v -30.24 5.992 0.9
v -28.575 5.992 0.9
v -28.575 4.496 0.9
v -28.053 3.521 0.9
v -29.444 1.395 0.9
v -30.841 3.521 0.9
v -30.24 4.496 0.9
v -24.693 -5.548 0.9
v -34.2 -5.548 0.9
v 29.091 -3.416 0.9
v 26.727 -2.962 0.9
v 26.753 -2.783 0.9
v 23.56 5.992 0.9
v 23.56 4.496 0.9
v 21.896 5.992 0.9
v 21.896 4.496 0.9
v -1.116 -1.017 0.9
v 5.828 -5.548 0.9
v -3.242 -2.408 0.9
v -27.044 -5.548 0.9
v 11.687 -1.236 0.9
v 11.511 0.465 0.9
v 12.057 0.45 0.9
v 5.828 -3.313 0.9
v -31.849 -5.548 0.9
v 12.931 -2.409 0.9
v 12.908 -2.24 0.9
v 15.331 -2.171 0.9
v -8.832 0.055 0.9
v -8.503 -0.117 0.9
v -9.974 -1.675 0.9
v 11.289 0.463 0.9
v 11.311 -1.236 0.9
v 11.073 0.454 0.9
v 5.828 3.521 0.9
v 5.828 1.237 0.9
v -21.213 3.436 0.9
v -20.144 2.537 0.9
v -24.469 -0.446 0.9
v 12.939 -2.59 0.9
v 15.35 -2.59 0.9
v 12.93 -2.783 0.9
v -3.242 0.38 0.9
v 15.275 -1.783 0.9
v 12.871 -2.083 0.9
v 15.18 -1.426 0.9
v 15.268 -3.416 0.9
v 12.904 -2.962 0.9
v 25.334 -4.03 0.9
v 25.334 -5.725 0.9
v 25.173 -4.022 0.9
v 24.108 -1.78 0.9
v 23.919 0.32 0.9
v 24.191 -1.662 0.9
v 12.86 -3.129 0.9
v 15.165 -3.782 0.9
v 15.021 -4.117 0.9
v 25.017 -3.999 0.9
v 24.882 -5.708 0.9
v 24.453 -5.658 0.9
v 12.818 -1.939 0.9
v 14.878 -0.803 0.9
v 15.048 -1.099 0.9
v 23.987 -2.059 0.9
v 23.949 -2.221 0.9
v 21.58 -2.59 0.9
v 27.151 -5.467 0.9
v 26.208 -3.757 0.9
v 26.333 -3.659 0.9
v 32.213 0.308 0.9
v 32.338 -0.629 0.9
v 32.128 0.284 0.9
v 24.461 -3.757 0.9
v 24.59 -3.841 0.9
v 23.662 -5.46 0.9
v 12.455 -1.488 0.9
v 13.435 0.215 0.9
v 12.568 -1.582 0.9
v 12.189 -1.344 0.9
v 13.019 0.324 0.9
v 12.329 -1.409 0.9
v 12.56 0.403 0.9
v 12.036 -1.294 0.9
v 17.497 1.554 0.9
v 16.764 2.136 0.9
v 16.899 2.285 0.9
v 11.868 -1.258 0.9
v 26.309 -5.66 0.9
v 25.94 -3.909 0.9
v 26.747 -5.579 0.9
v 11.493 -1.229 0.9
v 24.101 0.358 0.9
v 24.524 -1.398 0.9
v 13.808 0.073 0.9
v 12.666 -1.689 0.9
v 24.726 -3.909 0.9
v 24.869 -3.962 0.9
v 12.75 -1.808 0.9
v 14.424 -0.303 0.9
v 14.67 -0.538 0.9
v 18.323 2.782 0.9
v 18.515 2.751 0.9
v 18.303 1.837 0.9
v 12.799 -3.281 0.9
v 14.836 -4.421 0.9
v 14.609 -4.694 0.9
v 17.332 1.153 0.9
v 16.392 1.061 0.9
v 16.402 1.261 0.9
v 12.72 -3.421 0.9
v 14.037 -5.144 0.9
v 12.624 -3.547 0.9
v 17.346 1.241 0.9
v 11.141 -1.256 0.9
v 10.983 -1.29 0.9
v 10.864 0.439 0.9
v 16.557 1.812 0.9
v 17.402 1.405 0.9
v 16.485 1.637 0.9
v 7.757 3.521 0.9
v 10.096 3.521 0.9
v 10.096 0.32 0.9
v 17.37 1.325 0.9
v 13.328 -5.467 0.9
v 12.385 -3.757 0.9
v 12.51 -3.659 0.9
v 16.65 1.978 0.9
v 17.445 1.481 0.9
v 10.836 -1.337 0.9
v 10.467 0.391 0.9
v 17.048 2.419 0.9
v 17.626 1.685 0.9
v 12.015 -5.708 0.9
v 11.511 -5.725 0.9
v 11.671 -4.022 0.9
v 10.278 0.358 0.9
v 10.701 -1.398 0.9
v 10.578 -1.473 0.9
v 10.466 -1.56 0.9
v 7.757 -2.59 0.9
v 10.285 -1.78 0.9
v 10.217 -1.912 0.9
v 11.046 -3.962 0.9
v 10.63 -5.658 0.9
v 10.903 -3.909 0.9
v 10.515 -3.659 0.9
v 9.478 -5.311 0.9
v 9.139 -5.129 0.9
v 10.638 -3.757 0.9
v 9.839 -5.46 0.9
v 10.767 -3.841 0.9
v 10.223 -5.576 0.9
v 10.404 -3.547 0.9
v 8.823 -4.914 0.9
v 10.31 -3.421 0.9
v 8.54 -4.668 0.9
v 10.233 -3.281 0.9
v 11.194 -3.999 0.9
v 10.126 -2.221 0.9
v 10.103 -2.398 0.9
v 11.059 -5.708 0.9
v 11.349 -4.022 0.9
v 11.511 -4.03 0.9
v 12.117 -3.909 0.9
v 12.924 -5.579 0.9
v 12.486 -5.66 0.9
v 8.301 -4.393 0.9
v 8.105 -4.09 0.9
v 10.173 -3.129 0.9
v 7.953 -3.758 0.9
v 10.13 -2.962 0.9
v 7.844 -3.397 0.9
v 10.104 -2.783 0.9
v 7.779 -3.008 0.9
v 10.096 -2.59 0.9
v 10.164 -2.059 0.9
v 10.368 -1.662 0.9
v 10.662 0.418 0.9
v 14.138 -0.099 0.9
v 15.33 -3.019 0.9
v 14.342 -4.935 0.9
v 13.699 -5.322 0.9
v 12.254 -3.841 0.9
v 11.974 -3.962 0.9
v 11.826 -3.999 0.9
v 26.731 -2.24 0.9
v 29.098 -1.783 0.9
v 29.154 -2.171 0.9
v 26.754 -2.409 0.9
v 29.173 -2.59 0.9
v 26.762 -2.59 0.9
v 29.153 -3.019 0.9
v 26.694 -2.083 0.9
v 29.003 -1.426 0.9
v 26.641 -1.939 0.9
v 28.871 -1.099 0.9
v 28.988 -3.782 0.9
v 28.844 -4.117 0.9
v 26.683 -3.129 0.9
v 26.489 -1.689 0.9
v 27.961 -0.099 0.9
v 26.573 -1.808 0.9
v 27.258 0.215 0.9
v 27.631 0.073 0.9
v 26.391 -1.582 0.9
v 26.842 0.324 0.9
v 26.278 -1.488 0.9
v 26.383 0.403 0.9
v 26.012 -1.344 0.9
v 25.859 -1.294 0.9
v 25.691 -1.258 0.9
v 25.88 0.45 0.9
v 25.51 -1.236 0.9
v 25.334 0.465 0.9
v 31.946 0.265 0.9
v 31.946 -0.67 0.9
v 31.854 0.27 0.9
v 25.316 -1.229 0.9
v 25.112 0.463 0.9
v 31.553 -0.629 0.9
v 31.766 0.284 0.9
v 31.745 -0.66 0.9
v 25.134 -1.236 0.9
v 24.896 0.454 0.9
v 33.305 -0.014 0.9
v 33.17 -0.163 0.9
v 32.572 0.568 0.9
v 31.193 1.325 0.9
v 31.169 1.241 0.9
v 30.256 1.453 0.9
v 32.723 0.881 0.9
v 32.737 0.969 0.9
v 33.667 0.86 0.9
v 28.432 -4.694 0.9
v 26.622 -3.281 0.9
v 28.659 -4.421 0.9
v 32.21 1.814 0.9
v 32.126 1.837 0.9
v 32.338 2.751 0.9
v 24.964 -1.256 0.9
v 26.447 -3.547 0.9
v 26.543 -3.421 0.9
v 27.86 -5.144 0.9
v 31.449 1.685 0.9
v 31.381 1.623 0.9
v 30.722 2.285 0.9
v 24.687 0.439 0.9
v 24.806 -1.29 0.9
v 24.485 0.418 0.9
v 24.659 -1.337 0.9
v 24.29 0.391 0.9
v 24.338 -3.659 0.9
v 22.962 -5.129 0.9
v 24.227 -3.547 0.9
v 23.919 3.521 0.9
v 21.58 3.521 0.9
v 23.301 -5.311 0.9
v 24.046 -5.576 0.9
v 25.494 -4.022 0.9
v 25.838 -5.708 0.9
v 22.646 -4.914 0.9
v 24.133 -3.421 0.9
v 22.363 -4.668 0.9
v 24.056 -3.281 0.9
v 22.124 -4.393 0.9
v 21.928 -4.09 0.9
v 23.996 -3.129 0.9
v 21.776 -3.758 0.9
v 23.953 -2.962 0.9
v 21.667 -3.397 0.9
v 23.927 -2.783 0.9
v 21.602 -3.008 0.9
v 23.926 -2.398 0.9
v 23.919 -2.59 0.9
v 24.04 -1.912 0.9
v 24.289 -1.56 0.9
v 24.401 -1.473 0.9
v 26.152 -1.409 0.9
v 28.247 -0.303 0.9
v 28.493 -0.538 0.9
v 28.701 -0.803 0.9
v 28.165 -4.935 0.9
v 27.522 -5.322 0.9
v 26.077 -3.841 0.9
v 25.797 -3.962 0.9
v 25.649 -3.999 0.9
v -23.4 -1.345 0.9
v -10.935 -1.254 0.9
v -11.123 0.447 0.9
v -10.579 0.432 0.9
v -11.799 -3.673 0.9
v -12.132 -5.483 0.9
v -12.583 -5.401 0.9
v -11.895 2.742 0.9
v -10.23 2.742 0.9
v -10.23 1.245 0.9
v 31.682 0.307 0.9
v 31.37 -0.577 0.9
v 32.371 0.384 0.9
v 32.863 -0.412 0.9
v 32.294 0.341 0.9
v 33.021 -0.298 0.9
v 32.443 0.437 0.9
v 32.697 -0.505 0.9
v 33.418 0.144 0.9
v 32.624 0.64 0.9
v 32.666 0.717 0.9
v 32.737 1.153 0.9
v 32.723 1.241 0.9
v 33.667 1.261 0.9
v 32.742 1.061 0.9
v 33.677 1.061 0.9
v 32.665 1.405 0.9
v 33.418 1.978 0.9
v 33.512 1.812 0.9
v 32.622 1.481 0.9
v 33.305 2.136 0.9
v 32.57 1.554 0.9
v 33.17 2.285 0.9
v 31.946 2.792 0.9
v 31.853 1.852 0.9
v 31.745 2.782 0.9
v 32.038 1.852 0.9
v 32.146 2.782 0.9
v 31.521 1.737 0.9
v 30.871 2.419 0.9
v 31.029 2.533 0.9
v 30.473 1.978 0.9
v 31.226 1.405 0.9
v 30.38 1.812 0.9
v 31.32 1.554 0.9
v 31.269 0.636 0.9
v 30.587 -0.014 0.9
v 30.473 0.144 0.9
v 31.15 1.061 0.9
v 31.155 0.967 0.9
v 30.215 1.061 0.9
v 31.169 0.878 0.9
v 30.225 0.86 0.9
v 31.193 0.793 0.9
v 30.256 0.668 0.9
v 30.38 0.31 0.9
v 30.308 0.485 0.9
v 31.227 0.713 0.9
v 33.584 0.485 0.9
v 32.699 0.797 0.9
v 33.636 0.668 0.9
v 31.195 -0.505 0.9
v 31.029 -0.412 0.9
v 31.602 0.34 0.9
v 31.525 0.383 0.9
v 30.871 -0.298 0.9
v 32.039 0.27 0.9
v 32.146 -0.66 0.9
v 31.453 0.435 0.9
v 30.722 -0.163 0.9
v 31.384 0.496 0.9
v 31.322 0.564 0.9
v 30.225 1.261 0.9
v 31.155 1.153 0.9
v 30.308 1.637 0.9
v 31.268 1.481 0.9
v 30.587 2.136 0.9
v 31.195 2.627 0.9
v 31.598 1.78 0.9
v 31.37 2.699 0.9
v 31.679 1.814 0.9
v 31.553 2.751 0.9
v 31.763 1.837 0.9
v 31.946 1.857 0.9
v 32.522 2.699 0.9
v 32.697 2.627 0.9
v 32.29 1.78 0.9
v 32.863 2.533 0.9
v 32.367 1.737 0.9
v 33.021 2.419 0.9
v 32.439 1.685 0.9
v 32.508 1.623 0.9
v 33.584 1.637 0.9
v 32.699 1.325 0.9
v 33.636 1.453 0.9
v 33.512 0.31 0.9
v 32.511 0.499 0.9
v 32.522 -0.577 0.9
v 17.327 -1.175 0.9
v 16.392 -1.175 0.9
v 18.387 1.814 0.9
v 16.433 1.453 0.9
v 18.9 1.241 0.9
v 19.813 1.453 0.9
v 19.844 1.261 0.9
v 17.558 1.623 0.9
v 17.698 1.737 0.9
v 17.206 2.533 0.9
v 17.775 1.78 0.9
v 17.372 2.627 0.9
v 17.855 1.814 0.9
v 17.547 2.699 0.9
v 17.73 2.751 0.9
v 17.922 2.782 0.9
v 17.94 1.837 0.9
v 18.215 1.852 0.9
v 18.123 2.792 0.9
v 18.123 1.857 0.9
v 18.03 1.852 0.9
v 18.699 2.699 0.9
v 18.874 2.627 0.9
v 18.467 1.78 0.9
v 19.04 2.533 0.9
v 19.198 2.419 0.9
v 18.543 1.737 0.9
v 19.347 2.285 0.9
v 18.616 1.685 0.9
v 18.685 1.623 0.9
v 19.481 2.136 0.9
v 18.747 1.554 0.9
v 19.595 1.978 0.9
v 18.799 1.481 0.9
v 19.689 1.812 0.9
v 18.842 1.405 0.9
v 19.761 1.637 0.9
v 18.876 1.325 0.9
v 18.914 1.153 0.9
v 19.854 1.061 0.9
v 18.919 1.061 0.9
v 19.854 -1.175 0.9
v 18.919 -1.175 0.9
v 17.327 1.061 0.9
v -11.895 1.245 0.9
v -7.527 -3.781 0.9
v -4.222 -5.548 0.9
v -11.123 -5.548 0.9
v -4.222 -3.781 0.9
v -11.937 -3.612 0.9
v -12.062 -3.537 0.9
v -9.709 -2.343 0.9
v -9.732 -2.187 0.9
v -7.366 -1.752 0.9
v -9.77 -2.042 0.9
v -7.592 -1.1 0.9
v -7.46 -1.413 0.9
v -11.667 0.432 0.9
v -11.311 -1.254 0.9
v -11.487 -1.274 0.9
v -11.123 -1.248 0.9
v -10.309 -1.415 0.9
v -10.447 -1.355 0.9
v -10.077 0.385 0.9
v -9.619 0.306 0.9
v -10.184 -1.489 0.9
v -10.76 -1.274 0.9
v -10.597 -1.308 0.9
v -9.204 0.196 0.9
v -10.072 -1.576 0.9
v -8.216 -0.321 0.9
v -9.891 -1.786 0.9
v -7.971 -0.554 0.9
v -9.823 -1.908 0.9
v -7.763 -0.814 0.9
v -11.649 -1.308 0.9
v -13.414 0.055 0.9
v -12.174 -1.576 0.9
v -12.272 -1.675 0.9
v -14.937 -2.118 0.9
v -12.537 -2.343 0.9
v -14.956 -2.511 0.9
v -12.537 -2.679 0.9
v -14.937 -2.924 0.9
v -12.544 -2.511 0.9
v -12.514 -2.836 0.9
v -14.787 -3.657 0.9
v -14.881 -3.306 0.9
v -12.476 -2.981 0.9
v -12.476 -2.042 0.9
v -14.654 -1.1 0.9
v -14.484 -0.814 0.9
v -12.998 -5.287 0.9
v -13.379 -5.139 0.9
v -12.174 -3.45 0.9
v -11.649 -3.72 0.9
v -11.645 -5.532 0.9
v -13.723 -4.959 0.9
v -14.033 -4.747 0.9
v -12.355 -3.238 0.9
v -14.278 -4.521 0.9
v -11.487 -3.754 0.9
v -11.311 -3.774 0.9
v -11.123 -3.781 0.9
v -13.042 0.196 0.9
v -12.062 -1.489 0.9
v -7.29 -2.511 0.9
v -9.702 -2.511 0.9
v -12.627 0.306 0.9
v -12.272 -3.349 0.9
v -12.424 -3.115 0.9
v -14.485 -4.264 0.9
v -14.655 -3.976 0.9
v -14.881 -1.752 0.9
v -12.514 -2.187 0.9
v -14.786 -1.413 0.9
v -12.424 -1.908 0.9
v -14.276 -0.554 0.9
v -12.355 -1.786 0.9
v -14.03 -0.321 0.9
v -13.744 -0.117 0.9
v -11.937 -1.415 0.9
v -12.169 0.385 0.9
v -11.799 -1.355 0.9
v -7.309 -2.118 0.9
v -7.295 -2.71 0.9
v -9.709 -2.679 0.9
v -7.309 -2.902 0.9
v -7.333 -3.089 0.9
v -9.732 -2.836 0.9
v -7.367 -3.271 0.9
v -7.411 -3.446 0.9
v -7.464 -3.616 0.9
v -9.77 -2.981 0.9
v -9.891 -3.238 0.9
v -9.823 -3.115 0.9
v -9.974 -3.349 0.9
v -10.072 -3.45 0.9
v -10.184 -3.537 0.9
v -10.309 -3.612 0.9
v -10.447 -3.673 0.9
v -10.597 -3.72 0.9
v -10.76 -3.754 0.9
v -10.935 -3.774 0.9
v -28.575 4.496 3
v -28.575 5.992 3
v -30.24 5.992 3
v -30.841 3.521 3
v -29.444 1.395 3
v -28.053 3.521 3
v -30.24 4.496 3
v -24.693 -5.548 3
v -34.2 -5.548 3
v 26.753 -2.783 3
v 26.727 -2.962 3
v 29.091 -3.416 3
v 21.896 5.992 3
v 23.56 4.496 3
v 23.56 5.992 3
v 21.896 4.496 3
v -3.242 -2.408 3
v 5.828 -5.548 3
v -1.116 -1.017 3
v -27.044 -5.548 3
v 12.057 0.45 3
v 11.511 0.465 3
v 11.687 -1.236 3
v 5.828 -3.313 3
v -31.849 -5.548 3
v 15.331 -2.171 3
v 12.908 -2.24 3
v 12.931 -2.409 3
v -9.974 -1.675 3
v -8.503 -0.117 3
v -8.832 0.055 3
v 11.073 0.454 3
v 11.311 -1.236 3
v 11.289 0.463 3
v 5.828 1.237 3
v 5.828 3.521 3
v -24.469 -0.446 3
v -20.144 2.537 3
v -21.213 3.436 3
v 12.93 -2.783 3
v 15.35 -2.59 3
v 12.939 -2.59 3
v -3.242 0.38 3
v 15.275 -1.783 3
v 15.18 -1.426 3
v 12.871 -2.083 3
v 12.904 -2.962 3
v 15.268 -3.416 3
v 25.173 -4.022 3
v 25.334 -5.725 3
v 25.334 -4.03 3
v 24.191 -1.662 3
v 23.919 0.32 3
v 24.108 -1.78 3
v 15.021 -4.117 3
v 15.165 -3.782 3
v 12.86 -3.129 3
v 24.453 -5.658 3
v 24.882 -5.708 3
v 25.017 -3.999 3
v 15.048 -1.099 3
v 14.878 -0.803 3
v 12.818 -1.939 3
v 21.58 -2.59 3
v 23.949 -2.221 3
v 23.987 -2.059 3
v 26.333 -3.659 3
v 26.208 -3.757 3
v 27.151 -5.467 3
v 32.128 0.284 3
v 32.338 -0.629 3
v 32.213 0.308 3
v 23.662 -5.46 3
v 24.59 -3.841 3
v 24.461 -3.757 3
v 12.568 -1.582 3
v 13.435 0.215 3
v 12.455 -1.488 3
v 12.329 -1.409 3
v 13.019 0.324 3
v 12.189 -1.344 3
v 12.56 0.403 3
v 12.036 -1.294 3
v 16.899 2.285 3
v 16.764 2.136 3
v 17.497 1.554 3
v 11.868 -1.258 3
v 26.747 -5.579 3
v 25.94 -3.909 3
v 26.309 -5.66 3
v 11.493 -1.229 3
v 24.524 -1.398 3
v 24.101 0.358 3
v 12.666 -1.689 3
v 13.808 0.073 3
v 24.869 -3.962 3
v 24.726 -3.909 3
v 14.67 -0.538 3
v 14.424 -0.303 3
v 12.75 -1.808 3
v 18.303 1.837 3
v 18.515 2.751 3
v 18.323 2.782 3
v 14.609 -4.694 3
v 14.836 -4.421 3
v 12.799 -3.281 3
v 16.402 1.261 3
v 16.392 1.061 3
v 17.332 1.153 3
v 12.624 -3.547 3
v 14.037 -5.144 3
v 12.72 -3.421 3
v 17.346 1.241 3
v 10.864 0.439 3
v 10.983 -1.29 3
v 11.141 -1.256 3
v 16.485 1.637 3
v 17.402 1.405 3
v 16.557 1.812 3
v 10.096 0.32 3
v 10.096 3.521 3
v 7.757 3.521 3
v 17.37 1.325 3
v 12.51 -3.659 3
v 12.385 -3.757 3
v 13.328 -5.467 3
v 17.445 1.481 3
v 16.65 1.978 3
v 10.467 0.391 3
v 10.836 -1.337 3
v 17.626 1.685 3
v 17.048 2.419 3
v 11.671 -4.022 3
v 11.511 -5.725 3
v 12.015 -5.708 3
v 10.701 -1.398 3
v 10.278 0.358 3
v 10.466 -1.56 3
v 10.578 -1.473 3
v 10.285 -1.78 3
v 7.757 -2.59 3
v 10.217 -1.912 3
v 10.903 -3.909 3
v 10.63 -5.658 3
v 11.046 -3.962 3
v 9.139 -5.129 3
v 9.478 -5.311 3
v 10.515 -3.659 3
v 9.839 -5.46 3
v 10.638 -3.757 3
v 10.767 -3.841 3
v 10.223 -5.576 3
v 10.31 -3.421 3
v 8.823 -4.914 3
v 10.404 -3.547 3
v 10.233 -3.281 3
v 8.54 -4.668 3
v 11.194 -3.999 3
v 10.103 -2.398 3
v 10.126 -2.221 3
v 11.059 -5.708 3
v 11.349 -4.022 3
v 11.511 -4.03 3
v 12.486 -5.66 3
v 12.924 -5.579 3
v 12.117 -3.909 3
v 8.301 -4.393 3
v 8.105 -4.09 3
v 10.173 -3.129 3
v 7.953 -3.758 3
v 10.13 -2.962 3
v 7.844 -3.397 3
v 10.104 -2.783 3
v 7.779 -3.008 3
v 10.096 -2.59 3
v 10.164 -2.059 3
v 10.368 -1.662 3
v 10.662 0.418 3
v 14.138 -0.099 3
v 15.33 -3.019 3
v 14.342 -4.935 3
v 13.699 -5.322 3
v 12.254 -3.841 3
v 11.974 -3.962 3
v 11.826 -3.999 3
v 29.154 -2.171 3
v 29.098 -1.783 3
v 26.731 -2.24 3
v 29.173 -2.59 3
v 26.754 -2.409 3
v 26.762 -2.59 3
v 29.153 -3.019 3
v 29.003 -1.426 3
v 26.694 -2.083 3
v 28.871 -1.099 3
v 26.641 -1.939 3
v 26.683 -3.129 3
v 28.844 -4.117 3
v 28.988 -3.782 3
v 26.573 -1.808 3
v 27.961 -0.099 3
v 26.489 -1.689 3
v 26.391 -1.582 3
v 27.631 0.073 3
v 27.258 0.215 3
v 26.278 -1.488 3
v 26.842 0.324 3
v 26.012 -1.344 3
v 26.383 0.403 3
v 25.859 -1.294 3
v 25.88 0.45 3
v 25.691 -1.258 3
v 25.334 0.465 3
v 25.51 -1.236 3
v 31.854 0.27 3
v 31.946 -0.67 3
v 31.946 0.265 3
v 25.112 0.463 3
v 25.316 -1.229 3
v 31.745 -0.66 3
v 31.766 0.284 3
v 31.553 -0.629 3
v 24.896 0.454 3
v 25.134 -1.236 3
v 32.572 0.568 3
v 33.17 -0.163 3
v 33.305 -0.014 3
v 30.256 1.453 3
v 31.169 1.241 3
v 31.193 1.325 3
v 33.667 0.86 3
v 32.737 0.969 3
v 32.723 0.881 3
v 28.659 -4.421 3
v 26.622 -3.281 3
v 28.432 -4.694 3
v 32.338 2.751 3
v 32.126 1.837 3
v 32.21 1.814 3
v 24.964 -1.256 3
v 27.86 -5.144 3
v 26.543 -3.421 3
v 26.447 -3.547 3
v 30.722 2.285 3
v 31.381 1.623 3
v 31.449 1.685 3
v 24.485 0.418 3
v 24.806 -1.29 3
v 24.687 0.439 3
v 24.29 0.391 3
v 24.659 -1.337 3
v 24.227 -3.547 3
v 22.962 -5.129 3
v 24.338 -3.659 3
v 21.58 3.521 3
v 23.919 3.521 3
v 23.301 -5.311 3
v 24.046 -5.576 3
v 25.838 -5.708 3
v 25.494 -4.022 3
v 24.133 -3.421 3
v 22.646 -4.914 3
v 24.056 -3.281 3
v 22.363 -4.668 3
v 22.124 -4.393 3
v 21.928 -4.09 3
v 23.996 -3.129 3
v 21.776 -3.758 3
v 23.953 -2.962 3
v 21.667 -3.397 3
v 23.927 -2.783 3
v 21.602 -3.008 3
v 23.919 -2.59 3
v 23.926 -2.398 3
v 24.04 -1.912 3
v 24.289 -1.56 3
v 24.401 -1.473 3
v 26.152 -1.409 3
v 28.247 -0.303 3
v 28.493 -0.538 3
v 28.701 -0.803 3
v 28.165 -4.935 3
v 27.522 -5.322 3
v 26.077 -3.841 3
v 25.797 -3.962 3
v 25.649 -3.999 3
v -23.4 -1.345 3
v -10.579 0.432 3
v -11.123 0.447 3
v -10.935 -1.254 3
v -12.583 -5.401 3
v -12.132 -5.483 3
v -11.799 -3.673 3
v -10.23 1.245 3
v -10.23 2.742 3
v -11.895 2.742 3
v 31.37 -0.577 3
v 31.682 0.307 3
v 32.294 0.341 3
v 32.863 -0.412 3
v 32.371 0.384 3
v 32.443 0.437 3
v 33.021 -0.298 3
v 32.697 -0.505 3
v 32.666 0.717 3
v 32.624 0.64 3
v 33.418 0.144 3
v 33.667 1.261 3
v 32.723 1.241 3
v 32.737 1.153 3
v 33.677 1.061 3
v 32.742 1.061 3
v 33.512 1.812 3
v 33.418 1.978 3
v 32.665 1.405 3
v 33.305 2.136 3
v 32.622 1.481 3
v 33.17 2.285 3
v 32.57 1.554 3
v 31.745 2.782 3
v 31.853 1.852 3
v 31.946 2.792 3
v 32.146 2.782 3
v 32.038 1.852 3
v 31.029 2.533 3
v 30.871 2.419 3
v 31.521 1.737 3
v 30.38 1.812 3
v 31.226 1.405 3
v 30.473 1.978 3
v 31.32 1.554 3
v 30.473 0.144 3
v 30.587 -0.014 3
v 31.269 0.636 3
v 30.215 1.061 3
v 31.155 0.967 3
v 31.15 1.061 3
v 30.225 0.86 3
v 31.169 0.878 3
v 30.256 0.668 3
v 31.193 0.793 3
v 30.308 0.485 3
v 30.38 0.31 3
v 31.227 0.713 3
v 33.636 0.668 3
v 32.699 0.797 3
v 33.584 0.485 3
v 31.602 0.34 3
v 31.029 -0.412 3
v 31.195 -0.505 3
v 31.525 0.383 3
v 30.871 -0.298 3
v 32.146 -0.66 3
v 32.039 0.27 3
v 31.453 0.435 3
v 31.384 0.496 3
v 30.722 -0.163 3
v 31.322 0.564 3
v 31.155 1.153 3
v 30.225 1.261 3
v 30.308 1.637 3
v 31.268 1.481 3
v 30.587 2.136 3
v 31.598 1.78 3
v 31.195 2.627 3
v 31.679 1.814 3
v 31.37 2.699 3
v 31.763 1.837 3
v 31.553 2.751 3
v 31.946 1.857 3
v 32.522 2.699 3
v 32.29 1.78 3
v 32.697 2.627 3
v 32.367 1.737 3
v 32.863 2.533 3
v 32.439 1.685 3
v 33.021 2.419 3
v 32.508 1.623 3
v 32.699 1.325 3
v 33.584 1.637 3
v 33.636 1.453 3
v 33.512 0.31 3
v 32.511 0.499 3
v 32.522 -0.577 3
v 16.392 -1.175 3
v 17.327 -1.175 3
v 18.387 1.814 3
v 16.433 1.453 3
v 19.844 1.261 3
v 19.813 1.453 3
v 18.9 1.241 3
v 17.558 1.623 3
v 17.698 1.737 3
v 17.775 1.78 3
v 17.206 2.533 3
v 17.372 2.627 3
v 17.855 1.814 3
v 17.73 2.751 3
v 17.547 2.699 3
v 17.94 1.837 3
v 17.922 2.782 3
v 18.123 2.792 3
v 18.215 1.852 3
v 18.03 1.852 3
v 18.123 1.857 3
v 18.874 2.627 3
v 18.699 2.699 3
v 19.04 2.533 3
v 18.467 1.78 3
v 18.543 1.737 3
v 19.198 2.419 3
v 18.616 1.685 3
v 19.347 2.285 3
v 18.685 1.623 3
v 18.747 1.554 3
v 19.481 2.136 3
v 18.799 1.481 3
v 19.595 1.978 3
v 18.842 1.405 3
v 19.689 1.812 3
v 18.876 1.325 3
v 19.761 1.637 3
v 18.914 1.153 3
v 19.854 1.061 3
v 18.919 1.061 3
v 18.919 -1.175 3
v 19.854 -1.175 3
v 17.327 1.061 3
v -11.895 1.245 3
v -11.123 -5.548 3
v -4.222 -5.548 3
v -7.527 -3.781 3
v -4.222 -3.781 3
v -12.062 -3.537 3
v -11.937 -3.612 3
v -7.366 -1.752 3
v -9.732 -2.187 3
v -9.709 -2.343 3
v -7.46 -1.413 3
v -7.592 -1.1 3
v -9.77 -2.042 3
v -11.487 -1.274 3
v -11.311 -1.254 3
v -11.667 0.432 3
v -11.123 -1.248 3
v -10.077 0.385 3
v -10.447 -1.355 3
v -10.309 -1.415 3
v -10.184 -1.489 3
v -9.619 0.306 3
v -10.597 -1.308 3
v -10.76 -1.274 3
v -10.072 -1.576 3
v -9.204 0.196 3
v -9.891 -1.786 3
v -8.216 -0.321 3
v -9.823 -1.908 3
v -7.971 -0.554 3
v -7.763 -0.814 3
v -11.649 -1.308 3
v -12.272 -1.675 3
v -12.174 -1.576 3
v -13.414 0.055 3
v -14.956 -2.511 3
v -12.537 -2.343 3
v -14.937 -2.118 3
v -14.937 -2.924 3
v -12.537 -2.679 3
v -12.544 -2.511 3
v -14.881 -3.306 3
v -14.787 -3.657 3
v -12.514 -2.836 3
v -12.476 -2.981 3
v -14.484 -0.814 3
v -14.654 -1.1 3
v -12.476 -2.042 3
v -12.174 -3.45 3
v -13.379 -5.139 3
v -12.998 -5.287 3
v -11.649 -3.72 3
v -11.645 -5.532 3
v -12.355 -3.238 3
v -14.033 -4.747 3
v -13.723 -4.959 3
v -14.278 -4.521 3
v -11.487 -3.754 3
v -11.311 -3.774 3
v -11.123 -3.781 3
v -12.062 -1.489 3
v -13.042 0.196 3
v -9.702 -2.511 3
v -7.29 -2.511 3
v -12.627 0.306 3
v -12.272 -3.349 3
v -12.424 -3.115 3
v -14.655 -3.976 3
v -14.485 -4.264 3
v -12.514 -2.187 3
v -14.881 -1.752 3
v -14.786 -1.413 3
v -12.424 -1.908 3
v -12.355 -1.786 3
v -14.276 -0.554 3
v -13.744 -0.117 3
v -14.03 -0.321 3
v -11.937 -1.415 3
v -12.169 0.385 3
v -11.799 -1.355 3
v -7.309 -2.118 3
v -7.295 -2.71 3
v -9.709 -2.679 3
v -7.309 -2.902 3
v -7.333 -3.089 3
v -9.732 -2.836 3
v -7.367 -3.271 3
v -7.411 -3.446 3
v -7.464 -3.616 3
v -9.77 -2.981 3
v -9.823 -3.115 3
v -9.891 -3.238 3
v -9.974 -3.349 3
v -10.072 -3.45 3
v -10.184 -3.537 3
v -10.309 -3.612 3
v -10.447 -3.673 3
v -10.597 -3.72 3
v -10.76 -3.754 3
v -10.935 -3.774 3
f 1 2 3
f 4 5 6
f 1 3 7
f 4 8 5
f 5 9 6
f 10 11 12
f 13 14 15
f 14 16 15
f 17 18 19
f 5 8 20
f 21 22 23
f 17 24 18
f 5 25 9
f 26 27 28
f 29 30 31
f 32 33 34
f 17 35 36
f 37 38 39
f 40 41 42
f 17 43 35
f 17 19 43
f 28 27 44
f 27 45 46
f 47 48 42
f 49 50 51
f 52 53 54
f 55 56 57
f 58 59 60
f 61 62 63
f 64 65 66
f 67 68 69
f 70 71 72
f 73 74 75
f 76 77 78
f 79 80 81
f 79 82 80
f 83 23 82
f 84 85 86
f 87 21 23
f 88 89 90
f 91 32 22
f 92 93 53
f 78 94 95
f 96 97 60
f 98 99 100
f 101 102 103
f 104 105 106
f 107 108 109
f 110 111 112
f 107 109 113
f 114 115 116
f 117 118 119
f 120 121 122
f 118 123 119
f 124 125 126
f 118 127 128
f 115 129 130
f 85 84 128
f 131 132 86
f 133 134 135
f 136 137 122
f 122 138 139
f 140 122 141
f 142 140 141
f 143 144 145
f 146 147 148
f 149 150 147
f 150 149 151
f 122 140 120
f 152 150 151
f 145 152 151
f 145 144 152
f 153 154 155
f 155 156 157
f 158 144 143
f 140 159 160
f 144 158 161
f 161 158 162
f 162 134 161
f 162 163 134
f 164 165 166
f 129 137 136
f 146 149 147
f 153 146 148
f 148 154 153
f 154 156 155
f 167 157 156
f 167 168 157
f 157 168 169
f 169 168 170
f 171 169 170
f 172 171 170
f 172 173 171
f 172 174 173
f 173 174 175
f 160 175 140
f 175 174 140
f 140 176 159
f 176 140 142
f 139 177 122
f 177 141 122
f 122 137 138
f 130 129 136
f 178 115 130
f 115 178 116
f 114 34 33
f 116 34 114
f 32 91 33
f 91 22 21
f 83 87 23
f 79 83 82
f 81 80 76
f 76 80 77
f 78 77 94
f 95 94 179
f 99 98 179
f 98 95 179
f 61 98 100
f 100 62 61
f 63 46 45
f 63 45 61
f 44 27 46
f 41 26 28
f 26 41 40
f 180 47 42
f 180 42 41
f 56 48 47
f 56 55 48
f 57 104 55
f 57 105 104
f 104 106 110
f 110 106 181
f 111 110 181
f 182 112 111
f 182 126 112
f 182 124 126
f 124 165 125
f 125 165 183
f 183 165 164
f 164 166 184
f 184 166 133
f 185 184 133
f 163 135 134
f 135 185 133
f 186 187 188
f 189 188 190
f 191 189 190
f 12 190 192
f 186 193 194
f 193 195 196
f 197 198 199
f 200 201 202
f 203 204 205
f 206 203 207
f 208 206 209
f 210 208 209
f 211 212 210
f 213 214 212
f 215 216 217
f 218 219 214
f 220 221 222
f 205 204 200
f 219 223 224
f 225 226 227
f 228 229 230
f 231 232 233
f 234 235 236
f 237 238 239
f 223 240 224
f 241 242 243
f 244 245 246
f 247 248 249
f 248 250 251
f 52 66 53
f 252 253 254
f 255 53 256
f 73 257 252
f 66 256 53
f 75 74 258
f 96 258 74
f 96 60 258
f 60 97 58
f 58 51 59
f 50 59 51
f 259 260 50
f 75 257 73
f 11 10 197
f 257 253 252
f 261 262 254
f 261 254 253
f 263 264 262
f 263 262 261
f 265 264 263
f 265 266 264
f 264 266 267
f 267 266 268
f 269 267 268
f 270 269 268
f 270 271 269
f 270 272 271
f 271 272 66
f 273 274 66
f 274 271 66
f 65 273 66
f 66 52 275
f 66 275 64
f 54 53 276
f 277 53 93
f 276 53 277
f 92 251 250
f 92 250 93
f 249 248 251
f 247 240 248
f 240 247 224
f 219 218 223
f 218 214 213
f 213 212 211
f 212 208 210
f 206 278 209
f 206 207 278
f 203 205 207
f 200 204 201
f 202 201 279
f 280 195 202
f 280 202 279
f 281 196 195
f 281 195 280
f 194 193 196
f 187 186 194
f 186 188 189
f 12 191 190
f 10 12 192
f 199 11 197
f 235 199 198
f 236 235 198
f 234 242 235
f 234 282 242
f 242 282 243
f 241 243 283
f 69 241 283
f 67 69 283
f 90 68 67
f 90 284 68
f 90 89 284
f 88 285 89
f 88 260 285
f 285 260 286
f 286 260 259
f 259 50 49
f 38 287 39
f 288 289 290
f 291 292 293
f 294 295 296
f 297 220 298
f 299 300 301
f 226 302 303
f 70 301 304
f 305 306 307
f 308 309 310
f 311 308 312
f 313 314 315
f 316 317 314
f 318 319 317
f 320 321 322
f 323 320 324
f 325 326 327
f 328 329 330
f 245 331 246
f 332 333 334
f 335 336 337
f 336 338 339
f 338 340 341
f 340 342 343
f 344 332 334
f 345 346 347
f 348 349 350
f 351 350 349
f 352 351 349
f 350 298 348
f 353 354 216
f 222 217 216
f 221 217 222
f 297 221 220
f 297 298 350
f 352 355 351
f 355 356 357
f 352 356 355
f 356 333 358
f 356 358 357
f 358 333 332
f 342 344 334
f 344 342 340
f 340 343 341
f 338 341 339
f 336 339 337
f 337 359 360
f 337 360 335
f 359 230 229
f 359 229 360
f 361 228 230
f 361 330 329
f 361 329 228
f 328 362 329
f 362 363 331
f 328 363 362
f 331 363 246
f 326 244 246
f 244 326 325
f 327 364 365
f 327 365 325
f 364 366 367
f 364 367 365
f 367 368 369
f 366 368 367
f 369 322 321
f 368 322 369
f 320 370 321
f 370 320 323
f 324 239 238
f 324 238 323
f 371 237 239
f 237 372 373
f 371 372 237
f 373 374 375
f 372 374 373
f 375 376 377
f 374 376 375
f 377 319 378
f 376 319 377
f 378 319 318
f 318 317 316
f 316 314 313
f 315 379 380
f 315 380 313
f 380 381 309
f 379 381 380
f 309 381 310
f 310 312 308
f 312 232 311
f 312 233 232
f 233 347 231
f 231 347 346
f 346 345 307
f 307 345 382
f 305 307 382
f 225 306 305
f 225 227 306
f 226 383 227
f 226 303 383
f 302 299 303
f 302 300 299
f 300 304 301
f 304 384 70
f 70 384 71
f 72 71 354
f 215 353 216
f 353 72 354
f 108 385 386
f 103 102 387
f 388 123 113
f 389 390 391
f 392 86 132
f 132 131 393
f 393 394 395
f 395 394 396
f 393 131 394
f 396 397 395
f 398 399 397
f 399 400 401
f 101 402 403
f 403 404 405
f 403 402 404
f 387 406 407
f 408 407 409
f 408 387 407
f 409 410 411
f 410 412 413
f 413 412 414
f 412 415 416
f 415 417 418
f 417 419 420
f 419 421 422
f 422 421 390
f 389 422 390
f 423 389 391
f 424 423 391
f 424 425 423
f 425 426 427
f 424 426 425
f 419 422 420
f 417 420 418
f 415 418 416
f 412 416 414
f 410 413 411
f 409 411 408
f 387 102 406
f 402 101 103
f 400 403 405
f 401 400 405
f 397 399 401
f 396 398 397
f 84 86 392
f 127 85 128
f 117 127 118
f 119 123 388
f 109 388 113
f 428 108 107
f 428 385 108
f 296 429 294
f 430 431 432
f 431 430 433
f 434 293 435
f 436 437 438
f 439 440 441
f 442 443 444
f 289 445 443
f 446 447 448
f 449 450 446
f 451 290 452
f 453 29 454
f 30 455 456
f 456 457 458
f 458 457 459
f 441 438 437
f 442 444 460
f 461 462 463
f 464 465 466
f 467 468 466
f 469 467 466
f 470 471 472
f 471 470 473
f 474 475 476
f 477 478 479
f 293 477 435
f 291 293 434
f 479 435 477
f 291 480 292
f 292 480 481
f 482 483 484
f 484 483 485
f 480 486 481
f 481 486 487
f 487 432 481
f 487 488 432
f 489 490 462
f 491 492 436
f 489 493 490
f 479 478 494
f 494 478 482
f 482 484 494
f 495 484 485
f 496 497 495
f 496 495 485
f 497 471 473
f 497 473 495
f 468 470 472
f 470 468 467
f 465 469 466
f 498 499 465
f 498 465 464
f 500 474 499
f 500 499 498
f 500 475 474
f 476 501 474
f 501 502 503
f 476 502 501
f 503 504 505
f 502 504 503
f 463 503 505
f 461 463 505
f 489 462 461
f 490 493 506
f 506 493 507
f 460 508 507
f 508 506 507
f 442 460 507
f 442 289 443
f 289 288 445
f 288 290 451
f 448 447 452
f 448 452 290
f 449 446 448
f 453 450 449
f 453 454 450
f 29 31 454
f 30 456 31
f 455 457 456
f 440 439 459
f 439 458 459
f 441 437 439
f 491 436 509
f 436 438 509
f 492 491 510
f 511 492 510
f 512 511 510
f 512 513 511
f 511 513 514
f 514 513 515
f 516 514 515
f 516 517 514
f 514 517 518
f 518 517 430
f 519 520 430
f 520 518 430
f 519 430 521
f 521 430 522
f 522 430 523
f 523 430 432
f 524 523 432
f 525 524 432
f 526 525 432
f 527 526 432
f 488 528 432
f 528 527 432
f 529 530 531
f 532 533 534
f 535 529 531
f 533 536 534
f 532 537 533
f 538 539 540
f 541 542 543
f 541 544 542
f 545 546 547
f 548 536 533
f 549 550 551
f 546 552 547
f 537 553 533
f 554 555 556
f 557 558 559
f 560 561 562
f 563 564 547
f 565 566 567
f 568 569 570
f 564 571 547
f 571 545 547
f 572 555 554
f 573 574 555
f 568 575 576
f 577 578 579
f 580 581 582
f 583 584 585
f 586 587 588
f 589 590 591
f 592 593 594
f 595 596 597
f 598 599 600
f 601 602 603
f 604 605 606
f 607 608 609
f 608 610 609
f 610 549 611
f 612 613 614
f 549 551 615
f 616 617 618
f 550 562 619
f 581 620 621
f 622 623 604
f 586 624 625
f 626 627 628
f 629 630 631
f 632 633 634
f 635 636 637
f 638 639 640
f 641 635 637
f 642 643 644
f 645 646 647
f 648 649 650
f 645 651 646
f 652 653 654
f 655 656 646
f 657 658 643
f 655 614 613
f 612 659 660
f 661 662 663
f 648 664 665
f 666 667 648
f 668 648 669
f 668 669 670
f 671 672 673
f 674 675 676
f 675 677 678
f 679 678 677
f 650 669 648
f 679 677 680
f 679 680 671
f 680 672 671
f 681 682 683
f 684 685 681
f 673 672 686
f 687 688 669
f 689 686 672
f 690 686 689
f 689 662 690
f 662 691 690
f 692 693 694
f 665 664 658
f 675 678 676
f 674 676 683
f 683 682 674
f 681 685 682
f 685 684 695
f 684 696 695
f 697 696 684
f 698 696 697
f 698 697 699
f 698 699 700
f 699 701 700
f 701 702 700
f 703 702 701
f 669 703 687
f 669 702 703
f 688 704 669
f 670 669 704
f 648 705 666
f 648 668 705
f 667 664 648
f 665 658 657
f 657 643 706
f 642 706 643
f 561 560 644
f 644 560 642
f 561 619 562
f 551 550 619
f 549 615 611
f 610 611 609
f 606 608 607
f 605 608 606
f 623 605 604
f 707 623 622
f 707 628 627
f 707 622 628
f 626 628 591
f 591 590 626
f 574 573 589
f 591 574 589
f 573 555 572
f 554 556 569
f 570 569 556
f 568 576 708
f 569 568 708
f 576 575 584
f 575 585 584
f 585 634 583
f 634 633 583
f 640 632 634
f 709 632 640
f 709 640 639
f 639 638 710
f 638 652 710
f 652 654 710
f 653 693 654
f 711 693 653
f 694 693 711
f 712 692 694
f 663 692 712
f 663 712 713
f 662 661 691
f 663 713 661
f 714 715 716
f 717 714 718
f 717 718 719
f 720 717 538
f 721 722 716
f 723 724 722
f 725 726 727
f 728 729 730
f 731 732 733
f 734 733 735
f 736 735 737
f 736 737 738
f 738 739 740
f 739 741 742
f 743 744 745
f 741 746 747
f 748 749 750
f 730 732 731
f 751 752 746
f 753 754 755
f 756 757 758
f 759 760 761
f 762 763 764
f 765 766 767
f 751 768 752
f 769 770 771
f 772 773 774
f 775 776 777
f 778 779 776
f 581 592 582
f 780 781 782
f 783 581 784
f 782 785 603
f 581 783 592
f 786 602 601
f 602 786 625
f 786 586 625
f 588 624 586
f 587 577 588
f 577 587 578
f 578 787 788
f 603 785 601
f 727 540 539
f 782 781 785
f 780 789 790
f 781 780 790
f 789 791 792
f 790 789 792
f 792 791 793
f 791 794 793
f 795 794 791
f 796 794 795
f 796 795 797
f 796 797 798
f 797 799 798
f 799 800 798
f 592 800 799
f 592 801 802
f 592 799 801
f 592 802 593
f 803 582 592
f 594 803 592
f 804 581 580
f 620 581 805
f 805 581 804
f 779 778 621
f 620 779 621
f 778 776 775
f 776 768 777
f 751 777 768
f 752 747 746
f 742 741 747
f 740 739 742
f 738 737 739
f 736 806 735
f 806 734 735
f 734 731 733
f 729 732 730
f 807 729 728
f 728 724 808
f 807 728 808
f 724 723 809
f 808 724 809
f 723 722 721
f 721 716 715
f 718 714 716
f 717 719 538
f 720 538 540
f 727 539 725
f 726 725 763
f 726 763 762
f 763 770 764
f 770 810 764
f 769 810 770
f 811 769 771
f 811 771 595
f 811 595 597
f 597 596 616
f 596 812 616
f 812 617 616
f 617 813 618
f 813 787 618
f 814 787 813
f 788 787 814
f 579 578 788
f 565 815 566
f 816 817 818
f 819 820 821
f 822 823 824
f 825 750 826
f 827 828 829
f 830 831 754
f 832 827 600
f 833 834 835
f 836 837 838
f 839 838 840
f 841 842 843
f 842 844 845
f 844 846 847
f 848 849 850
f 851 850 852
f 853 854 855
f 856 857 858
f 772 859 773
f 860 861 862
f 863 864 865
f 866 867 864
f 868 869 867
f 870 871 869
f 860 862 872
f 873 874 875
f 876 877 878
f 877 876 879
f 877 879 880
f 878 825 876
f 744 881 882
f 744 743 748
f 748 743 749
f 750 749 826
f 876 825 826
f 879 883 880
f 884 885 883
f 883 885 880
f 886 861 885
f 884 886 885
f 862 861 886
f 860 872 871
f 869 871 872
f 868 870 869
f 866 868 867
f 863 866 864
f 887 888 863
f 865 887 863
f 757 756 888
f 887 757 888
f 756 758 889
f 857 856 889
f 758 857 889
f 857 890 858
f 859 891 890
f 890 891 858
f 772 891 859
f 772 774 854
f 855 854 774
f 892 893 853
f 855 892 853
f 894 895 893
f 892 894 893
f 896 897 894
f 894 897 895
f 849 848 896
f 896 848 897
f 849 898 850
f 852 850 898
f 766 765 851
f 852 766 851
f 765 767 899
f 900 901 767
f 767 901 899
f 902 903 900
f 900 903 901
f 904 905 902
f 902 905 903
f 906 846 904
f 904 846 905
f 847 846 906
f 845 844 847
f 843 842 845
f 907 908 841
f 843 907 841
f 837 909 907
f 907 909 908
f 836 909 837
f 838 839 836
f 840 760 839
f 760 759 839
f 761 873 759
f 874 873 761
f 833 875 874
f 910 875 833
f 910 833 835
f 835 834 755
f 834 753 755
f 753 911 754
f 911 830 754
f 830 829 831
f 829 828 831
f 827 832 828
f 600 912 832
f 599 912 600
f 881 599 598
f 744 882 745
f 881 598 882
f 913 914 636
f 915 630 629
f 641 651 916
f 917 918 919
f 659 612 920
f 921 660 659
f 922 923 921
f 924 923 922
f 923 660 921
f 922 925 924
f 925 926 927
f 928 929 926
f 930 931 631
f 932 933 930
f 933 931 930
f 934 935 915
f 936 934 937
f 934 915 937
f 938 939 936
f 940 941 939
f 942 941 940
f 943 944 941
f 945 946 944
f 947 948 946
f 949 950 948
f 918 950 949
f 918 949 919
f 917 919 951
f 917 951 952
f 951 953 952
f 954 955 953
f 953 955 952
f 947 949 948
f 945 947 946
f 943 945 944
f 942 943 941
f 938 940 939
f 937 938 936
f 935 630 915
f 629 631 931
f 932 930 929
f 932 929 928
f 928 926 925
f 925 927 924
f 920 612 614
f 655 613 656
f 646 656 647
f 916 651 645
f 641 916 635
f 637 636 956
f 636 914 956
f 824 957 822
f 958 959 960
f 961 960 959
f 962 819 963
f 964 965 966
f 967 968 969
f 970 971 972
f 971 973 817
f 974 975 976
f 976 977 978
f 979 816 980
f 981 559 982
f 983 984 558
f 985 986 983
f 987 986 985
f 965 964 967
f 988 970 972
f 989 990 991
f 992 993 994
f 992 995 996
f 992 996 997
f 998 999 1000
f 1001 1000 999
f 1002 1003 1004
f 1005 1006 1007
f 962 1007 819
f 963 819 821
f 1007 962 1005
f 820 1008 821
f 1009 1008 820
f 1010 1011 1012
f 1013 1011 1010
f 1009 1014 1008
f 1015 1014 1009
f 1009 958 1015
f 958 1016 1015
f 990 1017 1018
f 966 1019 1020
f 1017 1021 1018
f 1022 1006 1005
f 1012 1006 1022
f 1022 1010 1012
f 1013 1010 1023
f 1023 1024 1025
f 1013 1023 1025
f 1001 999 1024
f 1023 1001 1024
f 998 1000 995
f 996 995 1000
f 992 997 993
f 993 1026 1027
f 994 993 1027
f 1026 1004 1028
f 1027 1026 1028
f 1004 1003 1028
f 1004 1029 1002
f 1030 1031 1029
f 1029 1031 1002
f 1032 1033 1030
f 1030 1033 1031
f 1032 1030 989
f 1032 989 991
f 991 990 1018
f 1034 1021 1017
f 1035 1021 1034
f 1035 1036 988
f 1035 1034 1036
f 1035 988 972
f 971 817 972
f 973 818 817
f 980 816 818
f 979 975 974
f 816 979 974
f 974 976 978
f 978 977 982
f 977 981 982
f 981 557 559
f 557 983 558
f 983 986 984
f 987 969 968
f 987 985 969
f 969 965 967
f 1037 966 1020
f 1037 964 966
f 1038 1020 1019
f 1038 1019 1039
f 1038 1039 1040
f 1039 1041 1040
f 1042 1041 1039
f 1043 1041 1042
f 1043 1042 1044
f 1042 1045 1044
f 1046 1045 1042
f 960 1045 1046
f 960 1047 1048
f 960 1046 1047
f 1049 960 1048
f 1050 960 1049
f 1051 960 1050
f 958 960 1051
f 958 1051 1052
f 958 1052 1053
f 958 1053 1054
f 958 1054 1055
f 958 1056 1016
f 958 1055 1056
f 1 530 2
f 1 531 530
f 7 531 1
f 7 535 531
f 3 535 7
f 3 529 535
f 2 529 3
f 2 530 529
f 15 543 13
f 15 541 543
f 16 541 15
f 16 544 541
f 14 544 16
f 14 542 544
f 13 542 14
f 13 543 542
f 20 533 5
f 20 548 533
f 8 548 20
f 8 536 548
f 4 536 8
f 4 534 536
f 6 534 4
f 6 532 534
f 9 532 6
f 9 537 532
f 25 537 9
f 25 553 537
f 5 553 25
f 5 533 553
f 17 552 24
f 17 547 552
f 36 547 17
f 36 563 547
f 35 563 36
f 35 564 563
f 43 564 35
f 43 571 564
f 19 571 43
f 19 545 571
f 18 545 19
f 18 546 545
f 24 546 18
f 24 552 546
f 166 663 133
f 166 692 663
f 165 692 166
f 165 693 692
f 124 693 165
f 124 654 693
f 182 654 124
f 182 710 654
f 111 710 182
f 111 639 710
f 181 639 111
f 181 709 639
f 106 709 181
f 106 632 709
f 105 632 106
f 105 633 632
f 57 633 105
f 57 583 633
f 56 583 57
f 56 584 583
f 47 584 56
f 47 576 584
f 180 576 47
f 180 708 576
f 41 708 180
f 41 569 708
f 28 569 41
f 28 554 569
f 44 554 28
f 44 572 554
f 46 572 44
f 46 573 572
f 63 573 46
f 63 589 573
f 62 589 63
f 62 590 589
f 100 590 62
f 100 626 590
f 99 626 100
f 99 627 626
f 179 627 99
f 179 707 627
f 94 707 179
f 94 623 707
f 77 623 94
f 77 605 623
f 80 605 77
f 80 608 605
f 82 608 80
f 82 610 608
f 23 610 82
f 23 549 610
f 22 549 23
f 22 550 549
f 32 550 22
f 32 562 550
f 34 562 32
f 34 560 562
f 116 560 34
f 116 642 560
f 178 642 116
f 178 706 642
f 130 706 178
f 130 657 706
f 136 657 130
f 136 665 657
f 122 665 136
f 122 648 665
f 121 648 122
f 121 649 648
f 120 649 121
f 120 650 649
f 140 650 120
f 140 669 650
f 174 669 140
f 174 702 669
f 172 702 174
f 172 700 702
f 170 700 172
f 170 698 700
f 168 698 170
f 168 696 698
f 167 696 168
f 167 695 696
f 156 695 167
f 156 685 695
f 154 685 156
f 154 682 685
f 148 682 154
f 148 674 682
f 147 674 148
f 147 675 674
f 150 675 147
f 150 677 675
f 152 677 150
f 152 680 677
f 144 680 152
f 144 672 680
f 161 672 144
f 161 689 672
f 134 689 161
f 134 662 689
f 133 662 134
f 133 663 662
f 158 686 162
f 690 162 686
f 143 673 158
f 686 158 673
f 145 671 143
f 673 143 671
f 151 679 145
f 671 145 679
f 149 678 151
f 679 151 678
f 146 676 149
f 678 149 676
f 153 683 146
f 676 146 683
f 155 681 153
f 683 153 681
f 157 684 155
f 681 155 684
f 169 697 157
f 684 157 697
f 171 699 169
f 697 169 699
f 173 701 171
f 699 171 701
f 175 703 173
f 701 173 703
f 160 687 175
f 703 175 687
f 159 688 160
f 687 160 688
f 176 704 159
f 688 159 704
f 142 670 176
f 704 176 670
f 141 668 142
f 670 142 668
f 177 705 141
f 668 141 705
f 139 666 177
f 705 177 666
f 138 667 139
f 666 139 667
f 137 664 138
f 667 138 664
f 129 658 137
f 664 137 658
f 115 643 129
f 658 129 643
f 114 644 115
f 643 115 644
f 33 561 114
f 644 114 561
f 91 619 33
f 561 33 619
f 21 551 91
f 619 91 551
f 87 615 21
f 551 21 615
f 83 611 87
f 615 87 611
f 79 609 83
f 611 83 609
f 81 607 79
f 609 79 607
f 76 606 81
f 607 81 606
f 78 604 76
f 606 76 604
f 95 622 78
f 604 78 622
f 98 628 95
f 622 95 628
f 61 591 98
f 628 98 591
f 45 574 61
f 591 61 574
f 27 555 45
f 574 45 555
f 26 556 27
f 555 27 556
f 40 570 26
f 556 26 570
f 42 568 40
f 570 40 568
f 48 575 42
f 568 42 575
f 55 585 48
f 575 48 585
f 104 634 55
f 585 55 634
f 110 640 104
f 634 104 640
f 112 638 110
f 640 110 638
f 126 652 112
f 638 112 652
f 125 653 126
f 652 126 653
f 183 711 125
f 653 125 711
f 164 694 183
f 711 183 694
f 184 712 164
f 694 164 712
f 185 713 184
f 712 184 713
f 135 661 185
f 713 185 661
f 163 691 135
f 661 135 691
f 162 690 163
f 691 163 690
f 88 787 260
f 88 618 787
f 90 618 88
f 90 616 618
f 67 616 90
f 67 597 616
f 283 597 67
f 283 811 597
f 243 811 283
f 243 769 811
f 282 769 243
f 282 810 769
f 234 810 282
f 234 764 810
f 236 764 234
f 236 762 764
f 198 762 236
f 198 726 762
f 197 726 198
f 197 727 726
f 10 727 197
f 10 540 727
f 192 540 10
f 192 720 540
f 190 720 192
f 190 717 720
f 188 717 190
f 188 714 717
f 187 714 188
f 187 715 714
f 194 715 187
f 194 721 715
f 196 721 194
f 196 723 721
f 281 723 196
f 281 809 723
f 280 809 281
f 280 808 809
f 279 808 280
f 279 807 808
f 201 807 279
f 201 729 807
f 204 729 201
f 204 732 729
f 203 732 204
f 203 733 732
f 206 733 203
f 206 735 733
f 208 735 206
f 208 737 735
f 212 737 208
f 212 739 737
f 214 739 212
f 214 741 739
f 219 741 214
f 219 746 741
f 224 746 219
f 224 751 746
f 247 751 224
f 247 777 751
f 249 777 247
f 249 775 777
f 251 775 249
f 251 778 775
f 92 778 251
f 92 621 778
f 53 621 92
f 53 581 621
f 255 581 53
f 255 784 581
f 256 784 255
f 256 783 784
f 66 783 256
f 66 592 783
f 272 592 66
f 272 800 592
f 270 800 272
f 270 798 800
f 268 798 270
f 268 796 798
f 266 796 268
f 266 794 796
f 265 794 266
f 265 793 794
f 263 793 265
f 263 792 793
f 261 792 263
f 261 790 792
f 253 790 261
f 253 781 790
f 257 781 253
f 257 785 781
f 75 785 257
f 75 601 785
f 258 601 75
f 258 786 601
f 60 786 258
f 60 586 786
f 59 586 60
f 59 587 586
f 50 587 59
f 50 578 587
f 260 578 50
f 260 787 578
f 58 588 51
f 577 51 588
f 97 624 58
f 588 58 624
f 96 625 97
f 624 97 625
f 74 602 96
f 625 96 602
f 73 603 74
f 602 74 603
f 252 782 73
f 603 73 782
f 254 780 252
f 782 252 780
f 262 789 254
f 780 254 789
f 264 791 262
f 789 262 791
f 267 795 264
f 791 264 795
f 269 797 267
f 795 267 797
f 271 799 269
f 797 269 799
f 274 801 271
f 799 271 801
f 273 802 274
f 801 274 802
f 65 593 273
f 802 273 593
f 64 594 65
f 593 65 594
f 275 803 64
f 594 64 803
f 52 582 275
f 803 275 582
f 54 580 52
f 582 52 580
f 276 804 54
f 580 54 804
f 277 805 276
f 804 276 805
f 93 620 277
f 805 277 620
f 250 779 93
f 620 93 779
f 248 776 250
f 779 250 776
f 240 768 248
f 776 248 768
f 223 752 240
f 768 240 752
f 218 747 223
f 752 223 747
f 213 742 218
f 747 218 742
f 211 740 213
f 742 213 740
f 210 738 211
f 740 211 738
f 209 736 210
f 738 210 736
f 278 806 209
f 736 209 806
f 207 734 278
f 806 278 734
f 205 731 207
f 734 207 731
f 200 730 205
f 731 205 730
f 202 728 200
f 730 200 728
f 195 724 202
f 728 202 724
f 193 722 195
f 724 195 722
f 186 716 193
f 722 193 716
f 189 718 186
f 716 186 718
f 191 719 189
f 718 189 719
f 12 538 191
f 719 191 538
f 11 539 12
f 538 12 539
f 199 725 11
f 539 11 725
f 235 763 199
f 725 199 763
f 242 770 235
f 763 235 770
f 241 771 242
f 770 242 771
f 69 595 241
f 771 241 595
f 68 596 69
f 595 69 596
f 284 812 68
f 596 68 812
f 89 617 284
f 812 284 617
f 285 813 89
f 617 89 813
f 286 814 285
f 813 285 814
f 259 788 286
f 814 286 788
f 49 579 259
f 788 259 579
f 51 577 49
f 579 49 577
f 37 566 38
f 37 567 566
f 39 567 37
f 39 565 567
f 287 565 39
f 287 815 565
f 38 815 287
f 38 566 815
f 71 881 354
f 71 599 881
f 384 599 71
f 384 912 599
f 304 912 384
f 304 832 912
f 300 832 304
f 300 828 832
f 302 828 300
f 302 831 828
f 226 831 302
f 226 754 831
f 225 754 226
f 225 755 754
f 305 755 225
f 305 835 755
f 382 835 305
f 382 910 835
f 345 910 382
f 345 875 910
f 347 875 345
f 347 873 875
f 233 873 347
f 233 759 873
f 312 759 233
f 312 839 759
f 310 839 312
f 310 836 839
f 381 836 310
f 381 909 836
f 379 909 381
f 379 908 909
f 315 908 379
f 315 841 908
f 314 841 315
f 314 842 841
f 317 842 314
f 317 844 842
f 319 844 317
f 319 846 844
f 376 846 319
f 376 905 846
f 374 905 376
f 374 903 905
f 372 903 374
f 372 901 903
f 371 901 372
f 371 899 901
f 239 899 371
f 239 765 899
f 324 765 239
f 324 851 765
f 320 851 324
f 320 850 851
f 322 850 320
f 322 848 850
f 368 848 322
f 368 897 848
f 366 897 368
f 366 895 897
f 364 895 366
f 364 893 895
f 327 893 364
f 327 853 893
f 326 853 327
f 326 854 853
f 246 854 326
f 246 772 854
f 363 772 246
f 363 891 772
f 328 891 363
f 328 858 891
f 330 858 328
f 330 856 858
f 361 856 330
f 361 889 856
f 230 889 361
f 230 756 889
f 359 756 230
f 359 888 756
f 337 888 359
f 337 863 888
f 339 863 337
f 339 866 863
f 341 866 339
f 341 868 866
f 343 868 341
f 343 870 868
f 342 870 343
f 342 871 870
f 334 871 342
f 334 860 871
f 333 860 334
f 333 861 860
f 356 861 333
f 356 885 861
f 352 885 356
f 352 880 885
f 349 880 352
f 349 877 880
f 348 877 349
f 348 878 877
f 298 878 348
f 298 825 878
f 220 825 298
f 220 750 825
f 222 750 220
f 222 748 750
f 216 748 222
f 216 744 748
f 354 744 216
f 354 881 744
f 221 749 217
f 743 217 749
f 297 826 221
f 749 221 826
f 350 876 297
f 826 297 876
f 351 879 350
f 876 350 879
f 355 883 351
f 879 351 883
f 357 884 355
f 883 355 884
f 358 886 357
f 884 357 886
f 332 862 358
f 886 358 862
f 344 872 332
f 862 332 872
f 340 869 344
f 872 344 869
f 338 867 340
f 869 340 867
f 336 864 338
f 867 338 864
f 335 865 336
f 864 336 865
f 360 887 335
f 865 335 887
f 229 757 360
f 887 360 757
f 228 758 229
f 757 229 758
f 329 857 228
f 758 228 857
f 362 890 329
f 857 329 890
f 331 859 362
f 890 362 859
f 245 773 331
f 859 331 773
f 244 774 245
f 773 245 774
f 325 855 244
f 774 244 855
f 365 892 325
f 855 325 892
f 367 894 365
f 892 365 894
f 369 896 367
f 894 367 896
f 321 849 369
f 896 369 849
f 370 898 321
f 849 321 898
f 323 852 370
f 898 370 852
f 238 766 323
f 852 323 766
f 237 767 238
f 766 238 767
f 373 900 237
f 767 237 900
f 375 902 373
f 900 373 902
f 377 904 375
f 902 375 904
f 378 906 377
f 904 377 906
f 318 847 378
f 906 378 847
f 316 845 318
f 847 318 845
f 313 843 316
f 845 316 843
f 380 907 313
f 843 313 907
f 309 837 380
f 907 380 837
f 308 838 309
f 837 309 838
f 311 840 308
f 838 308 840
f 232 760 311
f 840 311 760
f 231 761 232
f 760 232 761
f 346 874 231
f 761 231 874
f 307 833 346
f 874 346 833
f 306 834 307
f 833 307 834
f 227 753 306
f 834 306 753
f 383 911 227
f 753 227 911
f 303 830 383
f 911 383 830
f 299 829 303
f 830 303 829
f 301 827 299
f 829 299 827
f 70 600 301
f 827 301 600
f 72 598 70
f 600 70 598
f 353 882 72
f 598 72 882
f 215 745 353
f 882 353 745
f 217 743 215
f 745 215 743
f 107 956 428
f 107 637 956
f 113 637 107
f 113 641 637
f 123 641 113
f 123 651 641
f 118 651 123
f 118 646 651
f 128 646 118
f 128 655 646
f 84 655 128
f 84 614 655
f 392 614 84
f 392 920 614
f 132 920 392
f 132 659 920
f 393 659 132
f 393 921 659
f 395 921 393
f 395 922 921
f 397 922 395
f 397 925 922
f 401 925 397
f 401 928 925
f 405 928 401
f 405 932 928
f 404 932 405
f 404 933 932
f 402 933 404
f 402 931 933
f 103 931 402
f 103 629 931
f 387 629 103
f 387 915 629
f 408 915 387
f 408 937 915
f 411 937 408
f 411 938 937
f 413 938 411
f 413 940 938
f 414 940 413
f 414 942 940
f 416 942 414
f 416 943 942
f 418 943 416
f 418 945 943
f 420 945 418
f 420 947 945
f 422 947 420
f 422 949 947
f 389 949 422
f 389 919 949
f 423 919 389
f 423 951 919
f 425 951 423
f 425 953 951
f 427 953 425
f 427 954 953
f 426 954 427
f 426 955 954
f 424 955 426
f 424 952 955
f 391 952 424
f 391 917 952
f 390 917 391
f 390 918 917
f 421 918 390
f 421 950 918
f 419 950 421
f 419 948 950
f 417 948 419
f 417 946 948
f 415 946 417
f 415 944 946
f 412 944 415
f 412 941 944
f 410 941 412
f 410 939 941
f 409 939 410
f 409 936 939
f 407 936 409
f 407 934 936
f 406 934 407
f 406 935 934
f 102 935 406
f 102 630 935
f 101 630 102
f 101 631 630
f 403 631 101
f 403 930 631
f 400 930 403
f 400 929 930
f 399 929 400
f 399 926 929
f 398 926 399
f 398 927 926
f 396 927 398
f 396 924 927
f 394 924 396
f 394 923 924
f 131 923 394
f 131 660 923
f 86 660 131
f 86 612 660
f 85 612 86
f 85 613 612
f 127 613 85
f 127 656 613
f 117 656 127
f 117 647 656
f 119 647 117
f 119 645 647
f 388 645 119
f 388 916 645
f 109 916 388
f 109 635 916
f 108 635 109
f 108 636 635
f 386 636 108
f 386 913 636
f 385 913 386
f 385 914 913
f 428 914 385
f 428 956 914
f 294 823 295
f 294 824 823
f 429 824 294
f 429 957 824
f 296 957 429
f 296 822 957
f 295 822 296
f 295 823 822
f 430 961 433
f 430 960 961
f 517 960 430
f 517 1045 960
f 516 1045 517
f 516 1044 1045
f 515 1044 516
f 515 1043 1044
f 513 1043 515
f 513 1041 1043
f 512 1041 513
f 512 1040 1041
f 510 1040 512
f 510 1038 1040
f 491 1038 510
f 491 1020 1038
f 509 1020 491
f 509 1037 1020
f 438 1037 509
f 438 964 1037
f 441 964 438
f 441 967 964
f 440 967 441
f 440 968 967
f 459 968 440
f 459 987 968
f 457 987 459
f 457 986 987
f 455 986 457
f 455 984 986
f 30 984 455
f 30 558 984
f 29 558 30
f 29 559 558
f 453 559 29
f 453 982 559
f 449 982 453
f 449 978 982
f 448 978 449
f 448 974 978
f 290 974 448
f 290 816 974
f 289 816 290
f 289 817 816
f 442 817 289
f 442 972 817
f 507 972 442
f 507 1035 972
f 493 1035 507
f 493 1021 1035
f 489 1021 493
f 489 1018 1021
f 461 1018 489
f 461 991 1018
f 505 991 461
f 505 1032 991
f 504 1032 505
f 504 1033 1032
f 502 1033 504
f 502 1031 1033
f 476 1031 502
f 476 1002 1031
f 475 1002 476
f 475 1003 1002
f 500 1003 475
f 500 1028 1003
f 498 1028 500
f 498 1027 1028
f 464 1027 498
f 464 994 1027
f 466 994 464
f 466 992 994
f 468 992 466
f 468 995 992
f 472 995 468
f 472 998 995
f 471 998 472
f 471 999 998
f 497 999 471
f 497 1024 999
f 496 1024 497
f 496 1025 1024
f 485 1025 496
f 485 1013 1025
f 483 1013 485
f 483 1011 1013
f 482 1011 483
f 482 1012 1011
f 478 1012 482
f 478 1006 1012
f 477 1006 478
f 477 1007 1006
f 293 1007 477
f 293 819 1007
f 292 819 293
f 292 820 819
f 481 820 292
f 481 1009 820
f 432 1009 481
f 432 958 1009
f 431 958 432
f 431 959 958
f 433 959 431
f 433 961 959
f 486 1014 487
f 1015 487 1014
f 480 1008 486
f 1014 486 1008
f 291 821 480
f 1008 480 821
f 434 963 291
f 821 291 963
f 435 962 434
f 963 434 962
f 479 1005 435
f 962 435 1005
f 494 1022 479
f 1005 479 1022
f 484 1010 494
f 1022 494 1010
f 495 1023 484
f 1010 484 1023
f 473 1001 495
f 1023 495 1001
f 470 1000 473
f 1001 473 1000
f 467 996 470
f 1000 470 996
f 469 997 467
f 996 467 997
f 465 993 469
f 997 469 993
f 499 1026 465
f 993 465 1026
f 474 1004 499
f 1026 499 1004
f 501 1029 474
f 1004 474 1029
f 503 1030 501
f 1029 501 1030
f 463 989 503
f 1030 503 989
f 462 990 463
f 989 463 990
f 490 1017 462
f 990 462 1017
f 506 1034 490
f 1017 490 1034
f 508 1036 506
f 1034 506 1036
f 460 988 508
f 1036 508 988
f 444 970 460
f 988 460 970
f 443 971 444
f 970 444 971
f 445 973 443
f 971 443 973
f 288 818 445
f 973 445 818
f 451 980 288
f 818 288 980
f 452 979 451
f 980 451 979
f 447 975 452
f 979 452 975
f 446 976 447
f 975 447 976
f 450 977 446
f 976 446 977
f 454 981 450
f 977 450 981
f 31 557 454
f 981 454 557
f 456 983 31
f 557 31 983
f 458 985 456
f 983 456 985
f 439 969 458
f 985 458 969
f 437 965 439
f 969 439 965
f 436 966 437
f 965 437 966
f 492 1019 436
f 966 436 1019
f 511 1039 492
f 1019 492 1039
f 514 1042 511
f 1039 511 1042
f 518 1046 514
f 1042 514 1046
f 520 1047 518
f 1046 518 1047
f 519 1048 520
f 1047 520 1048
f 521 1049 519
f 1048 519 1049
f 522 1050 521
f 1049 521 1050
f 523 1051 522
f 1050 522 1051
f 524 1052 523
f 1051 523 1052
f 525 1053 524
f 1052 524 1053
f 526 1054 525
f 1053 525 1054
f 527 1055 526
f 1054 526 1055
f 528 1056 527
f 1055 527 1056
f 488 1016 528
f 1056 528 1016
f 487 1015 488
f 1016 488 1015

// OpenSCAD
$fn = 48;
  // syllabics (overlaid on icon, tallest)
  translate([0, 0.000, 0.900]) linear_extrude(height=2.100) text("ᐲᐟ ᓈᐸᑲᐢᑳᐤ", size=8.958, halign="center", valign="center", font="Euphemia UCAS:style=Bold");
